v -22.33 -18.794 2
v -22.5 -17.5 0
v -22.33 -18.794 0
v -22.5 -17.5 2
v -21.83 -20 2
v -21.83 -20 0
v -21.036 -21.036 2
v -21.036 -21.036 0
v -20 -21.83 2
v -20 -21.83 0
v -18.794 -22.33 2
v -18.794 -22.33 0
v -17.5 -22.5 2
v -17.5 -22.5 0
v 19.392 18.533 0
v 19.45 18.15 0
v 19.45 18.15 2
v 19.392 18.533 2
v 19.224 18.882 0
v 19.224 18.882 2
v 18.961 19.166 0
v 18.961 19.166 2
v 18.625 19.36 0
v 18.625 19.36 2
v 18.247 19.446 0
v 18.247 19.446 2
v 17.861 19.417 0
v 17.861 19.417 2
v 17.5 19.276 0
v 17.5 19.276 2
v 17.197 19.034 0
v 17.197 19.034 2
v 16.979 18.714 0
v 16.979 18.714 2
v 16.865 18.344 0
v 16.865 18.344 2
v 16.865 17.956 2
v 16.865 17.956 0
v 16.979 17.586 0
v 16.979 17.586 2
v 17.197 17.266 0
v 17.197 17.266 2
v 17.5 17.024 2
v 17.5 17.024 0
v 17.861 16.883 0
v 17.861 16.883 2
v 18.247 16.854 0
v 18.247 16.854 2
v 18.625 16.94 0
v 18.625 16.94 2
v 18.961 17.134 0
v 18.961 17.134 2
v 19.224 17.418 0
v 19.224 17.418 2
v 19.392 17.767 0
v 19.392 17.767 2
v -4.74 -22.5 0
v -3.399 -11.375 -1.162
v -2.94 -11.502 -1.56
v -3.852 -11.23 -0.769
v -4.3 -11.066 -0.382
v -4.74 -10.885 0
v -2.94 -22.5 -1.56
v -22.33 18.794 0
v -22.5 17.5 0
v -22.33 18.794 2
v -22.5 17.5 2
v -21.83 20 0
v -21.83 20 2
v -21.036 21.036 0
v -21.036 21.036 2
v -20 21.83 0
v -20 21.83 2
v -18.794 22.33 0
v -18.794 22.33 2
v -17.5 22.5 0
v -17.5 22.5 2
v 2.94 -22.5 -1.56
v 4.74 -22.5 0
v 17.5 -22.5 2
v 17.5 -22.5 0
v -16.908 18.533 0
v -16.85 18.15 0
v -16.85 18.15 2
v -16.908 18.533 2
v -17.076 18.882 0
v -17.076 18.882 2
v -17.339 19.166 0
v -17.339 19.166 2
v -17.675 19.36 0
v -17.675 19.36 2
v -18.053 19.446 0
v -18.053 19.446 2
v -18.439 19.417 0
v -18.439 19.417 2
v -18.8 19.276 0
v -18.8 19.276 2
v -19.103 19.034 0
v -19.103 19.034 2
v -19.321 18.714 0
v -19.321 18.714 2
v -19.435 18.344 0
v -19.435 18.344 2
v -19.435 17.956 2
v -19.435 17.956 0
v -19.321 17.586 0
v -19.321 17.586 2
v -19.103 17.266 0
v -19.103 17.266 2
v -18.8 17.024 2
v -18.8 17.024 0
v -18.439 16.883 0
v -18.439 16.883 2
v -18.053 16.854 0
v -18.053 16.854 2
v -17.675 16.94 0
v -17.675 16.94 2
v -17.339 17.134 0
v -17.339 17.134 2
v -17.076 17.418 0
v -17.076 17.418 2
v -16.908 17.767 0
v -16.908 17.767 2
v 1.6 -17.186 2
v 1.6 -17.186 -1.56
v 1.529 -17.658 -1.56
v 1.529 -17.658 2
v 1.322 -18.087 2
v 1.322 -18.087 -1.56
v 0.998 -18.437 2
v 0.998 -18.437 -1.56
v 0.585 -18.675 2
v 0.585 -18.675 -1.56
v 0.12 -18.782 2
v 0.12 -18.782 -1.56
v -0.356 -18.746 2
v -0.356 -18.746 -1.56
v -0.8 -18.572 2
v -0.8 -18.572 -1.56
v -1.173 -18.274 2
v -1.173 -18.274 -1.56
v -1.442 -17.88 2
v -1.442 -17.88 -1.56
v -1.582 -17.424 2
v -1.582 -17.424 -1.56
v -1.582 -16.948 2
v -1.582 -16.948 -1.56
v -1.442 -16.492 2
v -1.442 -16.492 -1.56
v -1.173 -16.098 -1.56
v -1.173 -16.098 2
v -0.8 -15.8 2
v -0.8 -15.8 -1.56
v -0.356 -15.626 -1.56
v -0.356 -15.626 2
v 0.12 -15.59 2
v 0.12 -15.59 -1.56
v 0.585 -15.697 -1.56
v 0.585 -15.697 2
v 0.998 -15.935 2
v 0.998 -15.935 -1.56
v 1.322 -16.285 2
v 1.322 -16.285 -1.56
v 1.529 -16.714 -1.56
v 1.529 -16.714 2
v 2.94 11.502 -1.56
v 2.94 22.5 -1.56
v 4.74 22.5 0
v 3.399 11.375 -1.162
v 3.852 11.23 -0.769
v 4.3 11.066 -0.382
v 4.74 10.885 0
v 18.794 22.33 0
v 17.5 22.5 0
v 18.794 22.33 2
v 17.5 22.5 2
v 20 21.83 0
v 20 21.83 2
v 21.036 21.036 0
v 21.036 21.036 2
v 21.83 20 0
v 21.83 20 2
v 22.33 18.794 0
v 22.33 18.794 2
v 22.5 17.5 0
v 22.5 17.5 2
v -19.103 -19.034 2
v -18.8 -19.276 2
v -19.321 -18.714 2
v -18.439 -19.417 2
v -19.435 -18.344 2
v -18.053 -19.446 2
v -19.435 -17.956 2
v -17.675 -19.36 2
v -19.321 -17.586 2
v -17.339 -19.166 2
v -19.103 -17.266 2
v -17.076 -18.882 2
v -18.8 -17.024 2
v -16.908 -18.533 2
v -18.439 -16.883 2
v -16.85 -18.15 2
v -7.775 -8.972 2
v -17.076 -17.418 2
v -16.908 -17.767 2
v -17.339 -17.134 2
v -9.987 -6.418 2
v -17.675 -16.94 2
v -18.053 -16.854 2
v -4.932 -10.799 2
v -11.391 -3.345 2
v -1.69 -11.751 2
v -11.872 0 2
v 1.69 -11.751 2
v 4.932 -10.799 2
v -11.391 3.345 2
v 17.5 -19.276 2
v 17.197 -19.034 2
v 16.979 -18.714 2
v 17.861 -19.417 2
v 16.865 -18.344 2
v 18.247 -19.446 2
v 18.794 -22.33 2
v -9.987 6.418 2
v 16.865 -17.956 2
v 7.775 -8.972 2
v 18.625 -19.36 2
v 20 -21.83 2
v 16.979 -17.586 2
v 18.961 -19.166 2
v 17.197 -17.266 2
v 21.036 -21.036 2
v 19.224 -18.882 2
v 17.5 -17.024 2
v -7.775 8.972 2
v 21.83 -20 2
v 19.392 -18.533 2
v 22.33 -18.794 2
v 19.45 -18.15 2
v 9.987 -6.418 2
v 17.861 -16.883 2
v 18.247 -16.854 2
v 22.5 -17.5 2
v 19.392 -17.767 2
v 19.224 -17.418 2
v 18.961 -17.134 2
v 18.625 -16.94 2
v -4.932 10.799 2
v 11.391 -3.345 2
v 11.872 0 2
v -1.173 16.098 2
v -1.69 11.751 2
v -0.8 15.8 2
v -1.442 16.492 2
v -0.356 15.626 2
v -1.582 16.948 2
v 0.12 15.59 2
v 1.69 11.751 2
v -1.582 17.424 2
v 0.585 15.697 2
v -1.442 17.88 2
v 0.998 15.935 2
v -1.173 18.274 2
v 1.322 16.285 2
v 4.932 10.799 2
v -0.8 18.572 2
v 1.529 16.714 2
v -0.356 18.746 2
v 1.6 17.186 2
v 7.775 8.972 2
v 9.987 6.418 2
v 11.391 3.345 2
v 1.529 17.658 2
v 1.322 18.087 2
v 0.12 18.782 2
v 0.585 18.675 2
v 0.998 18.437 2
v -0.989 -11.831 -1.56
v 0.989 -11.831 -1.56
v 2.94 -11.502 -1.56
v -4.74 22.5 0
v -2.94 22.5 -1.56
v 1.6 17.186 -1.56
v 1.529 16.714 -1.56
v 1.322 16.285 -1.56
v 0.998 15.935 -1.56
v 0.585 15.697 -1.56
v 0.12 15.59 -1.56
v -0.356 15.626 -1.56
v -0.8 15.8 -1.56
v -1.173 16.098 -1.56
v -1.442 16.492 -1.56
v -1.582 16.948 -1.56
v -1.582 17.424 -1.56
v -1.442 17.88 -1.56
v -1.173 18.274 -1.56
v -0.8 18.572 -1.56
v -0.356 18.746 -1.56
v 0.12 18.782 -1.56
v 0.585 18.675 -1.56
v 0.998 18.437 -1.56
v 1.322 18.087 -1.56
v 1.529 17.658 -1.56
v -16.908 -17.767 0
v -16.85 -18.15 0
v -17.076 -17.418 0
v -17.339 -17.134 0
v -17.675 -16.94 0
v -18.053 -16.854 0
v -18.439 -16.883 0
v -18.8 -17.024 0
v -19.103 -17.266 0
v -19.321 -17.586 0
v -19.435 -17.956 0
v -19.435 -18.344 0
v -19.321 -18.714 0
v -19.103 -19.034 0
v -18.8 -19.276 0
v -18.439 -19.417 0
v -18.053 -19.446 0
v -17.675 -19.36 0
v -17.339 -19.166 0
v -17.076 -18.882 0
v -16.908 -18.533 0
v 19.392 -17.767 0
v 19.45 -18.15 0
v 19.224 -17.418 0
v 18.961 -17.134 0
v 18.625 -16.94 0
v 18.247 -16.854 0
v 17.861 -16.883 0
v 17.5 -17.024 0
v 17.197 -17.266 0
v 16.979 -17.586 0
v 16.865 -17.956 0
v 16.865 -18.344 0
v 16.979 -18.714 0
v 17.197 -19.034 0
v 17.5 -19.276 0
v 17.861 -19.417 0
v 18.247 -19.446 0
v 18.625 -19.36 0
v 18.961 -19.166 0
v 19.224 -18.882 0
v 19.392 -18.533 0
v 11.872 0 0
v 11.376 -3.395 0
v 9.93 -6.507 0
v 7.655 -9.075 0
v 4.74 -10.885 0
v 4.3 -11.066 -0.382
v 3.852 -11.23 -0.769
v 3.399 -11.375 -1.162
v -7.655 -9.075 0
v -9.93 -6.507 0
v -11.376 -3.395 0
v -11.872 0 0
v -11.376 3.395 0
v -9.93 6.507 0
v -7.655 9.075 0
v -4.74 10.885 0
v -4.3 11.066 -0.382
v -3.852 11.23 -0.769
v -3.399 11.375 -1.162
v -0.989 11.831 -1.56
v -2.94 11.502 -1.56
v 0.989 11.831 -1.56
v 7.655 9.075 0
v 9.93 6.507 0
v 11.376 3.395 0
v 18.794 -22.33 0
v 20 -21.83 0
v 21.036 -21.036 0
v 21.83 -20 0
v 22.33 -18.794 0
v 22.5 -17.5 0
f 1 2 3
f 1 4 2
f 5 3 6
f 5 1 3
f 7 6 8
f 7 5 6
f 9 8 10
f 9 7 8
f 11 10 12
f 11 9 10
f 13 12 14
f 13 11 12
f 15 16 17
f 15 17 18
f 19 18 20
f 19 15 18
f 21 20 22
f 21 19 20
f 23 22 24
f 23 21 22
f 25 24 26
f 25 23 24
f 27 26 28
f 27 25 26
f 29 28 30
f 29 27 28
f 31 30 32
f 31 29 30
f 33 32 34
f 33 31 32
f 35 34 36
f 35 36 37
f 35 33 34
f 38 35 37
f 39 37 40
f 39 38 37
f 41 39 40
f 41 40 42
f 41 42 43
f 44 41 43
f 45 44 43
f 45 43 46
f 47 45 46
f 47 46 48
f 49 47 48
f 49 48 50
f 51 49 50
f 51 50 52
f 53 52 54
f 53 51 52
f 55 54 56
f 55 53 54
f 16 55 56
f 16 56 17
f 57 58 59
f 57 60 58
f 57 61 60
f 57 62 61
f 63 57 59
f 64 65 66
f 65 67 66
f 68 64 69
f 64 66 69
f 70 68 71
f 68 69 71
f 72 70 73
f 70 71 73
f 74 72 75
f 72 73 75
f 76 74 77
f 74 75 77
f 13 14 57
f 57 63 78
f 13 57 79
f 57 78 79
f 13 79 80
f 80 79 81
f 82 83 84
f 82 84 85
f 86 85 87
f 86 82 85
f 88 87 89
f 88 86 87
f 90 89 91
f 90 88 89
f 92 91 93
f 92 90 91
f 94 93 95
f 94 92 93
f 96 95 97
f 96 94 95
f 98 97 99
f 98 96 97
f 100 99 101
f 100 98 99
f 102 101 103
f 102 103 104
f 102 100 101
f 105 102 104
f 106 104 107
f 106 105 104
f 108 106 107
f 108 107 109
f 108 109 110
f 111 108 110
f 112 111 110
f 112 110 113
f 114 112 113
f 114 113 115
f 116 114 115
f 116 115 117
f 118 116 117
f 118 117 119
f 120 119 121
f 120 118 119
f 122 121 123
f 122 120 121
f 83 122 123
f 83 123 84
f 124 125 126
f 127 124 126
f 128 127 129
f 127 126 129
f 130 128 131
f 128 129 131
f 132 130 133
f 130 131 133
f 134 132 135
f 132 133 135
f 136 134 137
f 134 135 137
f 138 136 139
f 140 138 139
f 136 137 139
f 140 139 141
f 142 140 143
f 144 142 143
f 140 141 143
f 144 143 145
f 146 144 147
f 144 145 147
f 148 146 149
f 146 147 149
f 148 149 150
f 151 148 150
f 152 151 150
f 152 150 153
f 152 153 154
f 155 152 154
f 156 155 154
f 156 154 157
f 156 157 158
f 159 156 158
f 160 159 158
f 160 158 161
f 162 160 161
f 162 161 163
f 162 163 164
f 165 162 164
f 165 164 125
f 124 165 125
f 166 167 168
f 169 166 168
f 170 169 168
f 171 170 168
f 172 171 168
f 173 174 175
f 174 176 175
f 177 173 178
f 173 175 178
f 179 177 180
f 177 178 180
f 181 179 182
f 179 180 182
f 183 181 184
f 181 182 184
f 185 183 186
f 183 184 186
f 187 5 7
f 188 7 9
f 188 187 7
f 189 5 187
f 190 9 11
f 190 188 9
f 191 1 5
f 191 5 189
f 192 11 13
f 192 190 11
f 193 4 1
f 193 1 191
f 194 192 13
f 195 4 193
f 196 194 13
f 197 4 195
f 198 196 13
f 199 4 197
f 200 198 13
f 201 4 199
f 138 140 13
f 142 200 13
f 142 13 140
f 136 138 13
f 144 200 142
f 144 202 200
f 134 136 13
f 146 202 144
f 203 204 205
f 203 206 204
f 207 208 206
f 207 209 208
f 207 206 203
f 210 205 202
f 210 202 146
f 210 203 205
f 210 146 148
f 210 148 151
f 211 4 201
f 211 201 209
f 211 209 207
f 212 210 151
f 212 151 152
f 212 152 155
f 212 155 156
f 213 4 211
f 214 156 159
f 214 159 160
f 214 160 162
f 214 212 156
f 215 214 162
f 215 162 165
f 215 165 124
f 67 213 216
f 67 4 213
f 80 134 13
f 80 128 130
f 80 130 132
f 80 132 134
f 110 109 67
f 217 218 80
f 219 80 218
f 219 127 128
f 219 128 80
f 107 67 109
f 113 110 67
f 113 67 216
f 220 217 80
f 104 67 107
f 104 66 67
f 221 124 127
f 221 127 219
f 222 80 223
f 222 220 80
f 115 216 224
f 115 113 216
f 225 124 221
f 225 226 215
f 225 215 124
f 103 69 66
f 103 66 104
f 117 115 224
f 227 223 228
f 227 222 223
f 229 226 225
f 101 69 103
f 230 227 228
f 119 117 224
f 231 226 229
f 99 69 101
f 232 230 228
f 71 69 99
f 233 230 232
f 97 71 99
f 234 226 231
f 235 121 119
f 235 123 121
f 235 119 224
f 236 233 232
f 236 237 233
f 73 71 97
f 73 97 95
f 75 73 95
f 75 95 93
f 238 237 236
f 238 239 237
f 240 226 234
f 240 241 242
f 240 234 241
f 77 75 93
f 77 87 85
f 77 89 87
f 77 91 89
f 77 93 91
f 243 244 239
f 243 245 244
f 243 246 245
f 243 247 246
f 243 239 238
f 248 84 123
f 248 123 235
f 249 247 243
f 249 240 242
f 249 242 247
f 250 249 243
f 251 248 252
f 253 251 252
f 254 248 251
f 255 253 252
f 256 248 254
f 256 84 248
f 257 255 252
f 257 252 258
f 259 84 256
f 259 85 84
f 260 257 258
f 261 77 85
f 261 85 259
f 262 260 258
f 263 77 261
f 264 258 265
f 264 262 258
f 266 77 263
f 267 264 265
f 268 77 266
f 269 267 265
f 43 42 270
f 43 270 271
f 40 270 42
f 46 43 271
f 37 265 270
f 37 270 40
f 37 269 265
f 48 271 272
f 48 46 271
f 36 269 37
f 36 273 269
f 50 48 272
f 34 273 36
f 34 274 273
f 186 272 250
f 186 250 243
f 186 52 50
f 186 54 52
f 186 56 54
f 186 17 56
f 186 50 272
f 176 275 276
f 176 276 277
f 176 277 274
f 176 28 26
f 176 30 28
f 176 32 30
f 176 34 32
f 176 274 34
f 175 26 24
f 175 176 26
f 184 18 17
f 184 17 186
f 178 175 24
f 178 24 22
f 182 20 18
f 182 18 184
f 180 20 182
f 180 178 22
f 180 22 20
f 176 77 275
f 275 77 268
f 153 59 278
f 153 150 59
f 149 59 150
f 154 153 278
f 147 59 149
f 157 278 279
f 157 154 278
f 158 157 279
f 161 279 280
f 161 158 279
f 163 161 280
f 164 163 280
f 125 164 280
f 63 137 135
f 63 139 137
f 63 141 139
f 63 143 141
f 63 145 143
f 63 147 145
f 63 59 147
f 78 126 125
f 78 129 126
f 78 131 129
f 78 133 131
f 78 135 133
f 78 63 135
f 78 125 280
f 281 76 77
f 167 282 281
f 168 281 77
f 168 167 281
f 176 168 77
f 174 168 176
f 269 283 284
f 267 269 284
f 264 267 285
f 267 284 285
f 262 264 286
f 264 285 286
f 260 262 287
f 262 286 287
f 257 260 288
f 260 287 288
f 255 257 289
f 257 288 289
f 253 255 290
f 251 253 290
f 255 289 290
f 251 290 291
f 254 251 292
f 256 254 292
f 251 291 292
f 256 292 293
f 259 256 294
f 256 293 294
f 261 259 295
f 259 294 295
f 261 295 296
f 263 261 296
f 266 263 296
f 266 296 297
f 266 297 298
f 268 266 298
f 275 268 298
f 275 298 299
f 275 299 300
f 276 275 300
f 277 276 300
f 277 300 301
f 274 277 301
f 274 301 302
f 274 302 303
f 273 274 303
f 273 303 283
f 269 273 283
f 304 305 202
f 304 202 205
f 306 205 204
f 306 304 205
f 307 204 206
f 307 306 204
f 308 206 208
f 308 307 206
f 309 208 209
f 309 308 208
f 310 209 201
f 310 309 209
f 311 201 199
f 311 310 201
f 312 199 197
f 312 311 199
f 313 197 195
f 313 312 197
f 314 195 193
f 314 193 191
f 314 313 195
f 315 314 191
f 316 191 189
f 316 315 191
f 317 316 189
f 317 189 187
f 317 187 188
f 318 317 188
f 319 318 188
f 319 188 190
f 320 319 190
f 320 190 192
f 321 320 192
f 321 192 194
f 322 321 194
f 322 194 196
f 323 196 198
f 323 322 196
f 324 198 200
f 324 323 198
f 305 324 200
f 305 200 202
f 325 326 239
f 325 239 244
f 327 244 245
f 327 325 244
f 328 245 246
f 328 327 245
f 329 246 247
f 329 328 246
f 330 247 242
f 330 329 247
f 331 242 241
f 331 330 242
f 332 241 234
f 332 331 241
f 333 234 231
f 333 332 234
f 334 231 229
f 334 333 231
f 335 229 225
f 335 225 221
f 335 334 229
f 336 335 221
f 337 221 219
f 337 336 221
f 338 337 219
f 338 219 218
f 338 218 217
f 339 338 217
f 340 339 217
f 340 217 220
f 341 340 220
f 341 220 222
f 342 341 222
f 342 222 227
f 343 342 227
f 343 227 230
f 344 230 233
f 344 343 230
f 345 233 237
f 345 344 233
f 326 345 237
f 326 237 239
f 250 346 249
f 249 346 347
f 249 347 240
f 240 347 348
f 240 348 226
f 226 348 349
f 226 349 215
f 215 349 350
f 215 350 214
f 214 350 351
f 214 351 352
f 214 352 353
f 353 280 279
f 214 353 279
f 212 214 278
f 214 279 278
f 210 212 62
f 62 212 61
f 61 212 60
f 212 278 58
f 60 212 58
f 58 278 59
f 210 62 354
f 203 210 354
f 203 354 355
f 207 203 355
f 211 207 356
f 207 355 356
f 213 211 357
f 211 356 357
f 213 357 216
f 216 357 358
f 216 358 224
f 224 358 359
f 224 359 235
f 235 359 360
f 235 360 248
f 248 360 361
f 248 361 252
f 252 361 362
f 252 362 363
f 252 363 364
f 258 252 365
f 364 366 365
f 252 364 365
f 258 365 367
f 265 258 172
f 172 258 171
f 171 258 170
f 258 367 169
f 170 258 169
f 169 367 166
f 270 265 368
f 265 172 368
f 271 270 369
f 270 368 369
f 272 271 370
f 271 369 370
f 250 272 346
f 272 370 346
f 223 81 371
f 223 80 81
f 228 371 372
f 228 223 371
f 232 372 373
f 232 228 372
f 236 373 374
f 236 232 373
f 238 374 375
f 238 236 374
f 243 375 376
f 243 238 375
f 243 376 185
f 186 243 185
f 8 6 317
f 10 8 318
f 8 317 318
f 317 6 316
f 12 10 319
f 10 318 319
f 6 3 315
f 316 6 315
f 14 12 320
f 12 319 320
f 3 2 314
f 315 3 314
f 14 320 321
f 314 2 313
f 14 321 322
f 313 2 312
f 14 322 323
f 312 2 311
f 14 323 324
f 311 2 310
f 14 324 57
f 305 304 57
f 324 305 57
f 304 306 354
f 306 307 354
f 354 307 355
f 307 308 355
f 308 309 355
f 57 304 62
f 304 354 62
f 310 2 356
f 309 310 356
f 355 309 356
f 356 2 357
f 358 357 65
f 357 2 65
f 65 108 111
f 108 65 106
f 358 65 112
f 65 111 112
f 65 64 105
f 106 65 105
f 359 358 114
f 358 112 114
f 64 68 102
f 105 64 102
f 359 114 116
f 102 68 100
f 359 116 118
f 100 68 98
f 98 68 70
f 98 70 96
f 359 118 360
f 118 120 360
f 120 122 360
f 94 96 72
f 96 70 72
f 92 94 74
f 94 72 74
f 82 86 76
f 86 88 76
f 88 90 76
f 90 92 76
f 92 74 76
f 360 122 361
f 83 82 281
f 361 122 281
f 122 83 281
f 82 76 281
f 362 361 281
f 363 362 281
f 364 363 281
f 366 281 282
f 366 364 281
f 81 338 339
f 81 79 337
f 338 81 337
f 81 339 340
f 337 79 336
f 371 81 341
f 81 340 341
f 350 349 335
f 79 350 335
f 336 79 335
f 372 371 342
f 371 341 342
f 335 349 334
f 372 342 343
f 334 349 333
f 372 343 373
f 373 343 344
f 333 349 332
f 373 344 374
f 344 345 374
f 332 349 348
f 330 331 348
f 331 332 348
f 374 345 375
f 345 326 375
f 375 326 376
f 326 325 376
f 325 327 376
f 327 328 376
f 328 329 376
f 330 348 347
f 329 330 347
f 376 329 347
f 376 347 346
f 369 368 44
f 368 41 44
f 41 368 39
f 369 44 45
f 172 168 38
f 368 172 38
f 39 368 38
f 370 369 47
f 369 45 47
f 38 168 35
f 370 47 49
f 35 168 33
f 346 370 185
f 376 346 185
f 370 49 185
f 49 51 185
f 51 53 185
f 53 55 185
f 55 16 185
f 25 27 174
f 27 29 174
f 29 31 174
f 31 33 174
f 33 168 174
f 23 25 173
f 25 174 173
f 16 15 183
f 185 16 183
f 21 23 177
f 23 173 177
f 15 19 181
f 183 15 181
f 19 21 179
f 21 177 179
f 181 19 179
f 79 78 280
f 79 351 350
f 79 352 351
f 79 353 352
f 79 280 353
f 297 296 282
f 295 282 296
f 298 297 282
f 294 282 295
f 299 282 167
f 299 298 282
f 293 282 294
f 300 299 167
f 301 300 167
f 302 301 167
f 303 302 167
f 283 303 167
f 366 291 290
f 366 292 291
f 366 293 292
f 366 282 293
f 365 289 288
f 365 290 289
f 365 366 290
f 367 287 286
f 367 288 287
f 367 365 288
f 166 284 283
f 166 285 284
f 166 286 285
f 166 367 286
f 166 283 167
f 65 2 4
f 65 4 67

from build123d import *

# Parameters (mm, degrees)
SKETCH_W      = 45
SKETCH_H      = 45
SKETCH_R      = 1.3
PAD_DEPTH     = 2
PAD001_DEPTH  = 45
SKETCH002_R   = 11.872
SKETCH002_R_2 = 1.6
POCKET_DEPTH  = 3.561
FILLET_R      = 5


with BuildPart() as part:
    # Sketch → Pad (new body)
    with BuildSketch(Plane.XY):
        Rectangle(SKETCH_W, SKETCH_H)
        with Locations((-18.15, 18.15)):
            Circle(SKETCH_R, mode=Mode.SUBTRACT)
        with Locations((-18.15, -18.15)):
            Circle(SKETCH_R, mode=Mode.SUBTRACT)
        with Locations((18.15, -18.15)):
            Circle(SKETCH_R, mode=Mode.SUBTRACT)
        with Locations((18.15, 18.15)):
            Circle(SKETCH_R, mode=Mode.SUBTRACT)
    extrude(amount=PAD_DEPTH)

    # Sketch001 (on Face3 of Pad) → Pad001 (join)
    with BuildSketch(Plane.XZ.offset(22.5)):
        Polygon((0, 0), (-4.74, 0), (-2.94, -1.56), (0, -1.56), (2.94, -1.56), (4.74, 0), align=None)
    extrude(amount=-PAD001_DEPTH)

    # Sketch002 (on Face13 of Pad001) → Pocket (cut, through all)
    with BuildSketch(Plane(origin=(0, 0, -1.56), x_dir=(1, 0, 0), z_dir=(0, 0, -1))):
        Circle(SKETCH002_R)
        with Locations((0, 17.186)):
            Circle(SKETCH002_R_2)
        with Locations((0, -17.186)):
            Circle(SKETCH002_R_2)
    extrude(amount=-POCKET_DEPTH, mode=Mode.SUBTRACT)

    # Fillet
    fillet_edges = [part.edges().sort_by_distance(p)[0] for p in [
        (22.5, -22.5, 1),
        (22.5, 22.5, 1),
        (-22.5, -22.5, 1),
        (-22.5, 22.5, 1),
    ]]
    fillet(fillet_edges, radius=FILLET_R)


solid = part.part
